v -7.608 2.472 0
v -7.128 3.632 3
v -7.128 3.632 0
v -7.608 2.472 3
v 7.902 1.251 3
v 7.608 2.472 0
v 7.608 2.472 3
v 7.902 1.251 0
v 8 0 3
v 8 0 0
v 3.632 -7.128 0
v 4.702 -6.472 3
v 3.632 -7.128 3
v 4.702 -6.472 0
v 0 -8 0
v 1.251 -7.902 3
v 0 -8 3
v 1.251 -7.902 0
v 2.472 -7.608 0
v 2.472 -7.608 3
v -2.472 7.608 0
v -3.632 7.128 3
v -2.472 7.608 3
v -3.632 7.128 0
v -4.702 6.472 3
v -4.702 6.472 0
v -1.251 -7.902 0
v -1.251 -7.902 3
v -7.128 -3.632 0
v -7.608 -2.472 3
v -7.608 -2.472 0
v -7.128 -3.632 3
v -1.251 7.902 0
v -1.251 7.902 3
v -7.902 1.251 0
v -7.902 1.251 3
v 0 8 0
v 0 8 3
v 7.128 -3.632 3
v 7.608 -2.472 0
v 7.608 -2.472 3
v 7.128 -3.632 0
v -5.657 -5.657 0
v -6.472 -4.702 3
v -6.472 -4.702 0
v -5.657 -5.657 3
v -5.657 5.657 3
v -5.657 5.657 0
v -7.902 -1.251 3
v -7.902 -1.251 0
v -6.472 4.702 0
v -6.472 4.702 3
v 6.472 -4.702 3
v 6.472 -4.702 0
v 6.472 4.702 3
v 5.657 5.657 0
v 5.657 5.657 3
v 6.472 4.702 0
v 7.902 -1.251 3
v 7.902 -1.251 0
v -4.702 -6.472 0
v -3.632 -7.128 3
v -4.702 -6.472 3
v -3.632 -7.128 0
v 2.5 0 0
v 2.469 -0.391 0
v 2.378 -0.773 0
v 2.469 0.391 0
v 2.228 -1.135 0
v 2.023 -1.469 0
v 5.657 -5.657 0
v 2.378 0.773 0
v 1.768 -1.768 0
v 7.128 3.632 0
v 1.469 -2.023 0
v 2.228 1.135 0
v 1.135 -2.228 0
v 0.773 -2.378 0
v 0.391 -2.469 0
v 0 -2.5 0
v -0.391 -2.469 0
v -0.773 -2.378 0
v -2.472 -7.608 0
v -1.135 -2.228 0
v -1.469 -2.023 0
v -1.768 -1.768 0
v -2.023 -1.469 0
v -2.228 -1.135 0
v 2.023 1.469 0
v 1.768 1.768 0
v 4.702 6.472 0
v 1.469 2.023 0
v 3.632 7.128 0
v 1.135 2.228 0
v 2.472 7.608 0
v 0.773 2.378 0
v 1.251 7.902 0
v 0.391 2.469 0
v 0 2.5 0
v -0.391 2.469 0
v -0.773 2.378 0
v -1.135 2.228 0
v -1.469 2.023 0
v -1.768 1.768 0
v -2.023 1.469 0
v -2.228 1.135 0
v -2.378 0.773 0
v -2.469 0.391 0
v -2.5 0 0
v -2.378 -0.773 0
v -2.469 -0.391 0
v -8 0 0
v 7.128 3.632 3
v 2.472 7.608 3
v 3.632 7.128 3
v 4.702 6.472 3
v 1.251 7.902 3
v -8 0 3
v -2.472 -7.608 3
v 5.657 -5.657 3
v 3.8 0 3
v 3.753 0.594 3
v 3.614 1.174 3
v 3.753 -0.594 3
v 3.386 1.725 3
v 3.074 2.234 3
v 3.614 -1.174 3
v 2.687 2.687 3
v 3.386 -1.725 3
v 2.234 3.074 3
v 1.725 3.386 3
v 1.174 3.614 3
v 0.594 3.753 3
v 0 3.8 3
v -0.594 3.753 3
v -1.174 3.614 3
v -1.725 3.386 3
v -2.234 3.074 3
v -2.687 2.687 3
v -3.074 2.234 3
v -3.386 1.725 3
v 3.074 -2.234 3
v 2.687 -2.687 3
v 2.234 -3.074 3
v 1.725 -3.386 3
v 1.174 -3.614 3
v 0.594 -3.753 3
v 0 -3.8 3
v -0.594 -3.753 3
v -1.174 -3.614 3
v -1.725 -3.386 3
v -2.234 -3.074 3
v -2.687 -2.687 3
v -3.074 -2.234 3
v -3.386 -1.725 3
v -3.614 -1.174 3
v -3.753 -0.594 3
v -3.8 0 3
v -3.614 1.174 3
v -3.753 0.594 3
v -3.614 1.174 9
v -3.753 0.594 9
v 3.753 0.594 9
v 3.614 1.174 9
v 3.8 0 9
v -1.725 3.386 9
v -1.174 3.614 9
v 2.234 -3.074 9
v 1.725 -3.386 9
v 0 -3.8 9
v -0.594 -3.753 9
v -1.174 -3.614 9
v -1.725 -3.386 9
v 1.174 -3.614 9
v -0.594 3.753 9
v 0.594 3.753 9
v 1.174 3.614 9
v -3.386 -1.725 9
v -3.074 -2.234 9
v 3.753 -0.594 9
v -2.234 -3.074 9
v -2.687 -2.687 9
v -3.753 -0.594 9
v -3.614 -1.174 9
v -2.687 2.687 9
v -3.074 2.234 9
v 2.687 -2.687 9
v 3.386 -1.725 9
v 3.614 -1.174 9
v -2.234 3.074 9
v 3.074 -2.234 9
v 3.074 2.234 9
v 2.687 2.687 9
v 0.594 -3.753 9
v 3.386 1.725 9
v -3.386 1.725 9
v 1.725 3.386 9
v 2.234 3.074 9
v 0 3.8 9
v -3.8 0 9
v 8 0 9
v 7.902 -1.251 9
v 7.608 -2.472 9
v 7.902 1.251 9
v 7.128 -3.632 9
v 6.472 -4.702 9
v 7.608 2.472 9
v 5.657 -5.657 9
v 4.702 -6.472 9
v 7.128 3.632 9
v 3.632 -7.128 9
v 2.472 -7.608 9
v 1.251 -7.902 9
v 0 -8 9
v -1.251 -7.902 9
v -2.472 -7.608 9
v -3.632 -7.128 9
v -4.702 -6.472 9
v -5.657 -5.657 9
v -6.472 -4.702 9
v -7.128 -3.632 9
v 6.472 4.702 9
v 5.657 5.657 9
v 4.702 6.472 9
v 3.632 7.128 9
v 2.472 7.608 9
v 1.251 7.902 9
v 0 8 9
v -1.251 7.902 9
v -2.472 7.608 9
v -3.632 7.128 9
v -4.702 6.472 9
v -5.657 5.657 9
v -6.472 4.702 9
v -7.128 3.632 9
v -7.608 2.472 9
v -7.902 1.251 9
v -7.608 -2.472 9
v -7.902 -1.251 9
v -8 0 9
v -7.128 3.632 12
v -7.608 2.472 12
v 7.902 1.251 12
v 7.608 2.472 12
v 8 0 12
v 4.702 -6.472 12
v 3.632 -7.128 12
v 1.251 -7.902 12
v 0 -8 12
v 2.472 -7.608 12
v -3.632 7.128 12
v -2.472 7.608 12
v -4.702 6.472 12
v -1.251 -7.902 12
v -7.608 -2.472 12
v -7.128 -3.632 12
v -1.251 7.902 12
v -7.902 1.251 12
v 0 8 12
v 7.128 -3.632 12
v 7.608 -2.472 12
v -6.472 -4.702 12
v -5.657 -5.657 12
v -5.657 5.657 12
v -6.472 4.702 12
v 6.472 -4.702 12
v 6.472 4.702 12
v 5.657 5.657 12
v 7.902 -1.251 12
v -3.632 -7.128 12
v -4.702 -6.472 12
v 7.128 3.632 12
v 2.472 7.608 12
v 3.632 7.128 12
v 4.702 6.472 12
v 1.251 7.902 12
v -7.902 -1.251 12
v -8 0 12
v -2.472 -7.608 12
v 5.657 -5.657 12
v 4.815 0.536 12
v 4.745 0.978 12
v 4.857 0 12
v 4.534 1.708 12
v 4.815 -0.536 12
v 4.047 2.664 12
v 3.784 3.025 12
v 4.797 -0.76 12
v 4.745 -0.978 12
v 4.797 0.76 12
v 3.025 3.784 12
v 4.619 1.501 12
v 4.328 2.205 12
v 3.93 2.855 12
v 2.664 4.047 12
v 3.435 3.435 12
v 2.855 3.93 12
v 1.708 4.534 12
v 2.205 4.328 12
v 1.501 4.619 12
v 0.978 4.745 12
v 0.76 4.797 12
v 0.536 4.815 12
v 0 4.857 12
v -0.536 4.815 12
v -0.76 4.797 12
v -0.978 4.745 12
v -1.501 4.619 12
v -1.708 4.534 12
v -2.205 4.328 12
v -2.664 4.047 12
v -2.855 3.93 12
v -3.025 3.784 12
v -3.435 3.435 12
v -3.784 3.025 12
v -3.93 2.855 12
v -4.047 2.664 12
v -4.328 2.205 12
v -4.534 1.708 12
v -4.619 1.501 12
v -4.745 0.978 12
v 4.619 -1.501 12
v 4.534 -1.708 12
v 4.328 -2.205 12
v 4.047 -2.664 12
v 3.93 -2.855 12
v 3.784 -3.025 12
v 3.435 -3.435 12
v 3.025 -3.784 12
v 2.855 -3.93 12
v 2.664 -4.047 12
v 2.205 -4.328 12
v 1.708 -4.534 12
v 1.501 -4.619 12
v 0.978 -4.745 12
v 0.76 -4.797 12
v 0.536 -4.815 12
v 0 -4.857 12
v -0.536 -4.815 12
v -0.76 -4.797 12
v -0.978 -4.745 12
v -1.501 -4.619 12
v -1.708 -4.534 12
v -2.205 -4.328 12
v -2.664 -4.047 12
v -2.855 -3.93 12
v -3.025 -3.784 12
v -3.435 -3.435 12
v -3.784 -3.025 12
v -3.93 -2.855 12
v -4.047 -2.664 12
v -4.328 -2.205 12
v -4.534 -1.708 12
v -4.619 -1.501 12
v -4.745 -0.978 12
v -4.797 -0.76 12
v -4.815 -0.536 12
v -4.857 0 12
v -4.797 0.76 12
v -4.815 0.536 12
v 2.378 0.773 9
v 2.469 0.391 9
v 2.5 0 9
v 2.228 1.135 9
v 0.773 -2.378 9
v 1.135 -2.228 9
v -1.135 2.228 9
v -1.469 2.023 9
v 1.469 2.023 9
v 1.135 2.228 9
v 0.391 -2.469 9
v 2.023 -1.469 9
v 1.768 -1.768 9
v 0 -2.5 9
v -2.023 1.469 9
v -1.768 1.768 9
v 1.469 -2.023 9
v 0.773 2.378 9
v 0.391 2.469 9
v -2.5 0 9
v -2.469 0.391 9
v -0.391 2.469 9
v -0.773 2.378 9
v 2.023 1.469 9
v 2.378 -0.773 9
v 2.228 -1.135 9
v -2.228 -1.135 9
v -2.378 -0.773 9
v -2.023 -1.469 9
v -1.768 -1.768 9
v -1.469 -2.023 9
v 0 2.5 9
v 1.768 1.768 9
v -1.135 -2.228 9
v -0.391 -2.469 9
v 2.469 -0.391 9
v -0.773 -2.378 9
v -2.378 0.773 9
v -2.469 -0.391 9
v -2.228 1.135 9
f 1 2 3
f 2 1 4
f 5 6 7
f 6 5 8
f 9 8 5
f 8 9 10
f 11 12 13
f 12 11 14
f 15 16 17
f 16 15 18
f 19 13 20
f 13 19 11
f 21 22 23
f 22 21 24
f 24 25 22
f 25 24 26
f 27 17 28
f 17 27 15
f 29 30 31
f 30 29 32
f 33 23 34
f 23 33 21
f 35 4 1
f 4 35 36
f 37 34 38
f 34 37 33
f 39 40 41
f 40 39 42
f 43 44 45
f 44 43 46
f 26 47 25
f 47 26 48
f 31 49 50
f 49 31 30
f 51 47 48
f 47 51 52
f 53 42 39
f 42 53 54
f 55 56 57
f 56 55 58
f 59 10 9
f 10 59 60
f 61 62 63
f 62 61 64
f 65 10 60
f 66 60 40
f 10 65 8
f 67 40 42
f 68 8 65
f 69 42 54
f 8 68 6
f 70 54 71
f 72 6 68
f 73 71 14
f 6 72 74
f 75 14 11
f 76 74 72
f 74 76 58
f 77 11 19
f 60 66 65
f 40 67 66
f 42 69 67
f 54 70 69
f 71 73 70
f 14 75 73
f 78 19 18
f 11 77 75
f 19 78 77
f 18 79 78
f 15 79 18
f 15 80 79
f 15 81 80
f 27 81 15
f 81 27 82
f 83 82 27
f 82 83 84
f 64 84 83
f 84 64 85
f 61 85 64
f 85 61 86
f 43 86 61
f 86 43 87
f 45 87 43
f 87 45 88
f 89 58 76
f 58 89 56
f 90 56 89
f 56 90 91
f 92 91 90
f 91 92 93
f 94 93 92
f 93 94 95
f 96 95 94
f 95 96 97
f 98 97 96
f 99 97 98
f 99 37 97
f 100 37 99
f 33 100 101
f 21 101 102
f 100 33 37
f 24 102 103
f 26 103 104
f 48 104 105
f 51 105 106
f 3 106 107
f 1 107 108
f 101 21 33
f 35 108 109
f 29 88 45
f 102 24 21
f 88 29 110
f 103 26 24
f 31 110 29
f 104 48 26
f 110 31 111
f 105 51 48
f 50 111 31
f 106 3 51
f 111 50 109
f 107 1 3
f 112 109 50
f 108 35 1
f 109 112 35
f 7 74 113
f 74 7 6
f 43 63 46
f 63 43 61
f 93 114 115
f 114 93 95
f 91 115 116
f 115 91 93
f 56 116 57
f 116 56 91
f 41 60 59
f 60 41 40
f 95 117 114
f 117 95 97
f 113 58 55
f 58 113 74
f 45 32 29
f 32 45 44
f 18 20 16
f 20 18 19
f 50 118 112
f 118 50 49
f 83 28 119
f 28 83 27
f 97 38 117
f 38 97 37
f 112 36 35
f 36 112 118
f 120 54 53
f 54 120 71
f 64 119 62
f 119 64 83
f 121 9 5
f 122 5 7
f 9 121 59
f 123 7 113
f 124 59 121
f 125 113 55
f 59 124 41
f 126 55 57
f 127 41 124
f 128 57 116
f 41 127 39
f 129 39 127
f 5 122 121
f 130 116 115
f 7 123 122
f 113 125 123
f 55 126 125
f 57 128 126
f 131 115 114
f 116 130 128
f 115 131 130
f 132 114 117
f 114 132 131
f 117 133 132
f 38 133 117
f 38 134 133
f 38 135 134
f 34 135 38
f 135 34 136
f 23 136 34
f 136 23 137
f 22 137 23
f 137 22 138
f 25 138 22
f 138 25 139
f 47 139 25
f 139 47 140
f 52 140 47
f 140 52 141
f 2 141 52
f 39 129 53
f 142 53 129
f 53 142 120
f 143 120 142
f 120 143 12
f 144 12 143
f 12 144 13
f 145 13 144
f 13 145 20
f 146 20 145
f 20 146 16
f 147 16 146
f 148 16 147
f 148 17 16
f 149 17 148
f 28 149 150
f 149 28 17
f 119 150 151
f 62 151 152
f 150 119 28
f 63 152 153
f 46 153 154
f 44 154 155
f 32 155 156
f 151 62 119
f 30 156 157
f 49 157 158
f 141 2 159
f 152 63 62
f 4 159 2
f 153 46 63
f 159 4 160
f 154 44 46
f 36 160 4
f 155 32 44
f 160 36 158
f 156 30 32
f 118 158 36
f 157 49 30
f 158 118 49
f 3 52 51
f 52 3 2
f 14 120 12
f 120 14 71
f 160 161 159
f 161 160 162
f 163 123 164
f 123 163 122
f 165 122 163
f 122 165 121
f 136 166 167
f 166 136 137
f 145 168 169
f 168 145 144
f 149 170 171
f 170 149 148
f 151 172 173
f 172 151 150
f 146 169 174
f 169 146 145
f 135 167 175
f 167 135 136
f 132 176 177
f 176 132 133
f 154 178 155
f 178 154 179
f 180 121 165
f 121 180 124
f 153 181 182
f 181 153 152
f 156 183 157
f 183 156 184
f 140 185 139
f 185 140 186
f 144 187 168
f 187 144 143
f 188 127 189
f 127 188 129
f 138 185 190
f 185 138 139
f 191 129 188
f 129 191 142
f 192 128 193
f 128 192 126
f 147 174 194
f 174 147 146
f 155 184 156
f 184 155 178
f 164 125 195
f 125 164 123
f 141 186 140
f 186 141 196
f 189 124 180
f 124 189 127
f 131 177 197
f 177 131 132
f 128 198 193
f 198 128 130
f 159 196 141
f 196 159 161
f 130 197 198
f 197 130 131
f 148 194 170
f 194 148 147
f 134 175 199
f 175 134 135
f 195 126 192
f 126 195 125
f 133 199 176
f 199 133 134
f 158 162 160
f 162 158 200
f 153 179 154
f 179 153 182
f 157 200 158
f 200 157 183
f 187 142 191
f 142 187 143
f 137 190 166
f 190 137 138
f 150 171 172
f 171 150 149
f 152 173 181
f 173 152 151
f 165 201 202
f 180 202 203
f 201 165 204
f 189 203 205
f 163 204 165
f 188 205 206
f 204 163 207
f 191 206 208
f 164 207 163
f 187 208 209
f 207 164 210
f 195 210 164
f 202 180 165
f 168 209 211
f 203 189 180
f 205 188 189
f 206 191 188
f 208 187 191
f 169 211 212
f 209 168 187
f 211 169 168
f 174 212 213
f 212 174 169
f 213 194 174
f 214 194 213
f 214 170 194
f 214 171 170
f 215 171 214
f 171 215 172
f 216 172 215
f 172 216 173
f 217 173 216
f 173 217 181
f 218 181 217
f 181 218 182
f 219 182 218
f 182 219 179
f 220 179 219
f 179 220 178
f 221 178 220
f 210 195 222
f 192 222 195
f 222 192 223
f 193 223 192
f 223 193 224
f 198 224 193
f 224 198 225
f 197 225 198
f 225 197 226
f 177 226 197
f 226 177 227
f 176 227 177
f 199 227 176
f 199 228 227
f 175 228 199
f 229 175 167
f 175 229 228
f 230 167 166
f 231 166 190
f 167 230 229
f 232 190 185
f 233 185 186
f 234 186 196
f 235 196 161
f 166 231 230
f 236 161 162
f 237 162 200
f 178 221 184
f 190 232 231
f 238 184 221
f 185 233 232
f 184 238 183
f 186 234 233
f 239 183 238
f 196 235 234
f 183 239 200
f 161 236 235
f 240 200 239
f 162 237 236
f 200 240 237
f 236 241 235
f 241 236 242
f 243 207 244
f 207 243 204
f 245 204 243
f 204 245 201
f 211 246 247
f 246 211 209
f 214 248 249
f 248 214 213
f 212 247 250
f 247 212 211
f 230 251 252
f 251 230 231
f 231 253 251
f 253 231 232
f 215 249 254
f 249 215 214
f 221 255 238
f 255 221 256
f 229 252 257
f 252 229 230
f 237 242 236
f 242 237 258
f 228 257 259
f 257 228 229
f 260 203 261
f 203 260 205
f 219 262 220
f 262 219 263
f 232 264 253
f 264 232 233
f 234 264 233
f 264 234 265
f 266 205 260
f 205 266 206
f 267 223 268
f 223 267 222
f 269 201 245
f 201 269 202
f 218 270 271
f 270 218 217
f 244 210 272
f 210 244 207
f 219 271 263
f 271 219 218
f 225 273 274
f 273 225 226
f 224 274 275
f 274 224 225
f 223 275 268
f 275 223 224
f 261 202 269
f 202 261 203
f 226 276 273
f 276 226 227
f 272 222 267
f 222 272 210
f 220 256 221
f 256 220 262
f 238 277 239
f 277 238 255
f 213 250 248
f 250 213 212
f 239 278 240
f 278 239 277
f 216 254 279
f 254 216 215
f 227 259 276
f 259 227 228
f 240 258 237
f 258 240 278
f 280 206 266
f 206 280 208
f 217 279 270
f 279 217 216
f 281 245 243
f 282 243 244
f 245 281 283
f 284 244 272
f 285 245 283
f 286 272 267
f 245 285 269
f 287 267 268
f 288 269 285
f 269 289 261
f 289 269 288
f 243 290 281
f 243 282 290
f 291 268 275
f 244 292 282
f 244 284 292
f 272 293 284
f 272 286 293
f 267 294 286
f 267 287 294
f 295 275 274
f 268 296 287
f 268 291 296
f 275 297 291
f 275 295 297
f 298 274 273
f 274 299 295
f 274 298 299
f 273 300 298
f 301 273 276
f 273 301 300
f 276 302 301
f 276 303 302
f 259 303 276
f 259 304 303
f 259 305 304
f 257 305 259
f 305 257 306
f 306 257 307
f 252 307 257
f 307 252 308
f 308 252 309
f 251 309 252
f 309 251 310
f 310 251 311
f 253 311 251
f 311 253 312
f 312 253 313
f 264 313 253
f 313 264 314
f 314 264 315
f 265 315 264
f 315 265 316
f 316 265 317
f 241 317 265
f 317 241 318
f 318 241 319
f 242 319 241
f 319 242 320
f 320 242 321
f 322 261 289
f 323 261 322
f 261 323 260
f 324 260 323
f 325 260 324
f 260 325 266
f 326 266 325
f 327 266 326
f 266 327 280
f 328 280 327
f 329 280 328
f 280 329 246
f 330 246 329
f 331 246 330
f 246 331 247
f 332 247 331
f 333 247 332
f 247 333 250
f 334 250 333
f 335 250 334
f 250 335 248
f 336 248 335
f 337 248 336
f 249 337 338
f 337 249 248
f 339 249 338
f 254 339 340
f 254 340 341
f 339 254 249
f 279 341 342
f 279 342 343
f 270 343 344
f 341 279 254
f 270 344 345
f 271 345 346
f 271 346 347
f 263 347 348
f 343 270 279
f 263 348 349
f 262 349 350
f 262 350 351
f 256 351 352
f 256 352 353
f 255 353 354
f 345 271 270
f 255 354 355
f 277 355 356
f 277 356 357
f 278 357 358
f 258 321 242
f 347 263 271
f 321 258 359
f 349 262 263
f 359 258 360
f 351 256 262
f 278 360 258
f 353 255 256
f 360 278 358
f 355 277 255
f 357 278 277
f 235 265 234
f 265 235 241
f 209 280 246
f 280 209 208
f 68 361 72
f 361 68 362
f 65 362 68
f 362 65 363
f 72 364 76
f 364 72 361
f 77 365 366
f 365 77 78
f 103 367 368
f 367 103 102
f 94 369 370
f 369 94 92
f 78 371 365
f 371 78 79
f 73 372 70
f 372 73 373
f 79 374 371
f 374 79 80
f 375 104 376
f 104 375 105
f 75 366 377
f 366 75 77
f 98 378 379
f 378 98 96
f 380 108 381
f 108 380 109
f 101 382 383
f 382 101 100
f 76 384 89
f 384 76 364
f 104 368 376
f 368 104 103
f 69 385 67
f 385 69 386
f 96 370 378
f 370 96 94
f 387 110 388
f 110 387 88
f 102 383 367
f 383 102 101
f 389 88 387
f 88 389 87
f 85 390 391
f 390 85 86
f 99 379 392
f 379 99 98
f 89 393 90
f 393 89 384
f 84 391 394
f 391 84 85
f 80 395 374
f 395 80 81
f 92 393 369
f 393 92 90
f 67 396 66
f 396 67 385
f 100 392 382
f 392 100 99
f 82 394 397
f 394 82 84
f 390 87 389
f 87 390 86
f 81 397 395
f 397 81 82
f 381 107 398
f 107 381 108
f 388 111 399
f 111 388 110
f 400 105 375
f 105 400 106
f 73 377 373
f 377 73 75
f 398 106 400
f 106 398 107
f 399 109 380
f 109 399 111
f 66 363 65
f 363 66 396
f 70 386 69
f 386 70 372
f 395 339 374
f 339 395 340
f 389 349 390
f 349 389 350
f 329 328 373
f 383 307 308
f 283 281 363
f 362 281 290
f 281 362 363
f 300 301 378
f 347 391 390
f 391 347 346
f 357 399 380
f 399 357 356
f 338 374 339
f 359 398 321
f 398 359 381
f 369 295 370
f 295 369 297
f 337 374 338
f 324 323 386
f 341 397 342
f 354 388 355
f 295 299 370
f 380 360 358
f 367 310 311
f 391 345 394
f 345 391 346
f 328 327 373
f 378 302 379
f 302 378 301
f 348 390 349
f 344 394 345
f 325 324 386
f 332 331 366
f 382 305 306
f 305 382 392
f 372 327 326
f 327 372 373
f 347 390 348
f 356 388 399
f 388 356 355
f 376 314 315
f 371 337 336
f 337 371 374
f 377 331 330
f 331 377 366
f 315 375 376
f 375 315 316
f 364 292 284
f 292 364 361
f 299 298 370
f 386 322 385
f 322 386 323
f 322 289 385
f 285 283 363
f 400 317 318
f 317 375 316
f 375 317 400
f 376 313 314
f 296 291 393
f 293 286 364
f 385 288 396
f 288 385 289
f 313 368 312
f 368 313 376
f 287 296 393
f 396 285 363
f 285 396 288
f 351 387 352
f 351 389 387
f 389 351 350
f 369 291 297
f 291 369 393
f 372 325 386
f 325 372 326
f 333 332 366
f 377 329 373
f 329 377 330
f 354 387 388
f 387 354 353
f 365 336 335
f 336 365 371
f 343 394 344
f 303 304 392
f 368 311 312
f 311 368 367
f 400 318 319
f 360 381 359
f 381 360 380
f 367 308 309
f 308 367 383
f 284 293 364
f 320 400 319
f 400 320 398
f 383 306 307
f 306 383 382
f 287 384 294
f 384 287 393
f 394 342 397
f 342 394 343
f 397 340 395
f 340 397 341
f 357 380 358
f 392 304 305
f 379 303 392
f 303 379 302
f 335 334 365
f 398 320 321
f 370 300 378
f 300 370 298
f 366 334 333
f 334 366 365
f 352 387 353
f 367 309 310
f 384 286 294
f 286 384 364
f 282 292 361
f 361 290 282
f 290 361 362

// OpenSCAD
/******************************************************************************/
/**********                     INFO                                 **********/
/******************************************************************************/
/*
Rail Button 1.0 April 2016
by David Buhler

Rail buttons or guides for model and high power rockets launching from 1010 or 
1515 size slot aluminum extrusions. ( https://www.8020.net/ ). These are not as 
strong as the delrin or nylon versions but hey you can easily make this yourself.
The 1515 guides are set to use 8-32 screws but could be opened up a bit for 
10-32 screws with a 3/16" drill bit.

Use support so the upper disk of the button is supported and straight. This is 
the portion that is inserted inside the rail and most critical for fit. 
Alternatively you could print these upside down and have the inside rail portion 
cleanly built. Your choice. I used three walls (1.2mm) . 

Attribution-NonCommercial 3.0 (CC BY-NC 3.0)
http://creativecommons.org/licenses/by-nc/3.0/

*/

/******************************************************************************/
/**********                     Settings                             **********/
/******************************************************************************/
//adjust the follow to meet your needs,  all measurements in mm.

/* [Select Button] */
button_to_make="1515";//[1010,1515,manual]

/* [Manual Button Diameters] */
man_button_outer_dia=11.1;//
man_button_inner_dia=5.8;//
man_thickness=1.9;//
man_button_middle=3.8;//
man_screw_size=3.05;//



/******************************************************************************/
/**********                   Variable Calcs                         **********/
/****                     no need to adjust these                      ********/
/******************************************************************************/
/* [HIDDEN] */
//1010 button, 
button_outer_dia=11.1;
button_inner_dia=5.8;
thickness=1.9;
button_middle=3.8;
screw_size=3.05;

//1515 button
button_outer_dia_1515=16;
button_inner_dia_1515=7.6;
thickness_1515=3;
button_middle_1515=6;
screw_size_1515=5;

/******************************************************************************/
/**********                  Make It Happen Stuff                    **********/
/******************************************************************************/
if (button_to_make=="1010"){
    difference(){
        union(){
            cylinder(r=button_outer_dia/2,h=thickness,$fn=40);//bottom disk
            translate([0,0,thickness]) 
                cylinder (r=button_inner_dia/2,h=button_middle,$fn=40);//middle slot
            translate([0,0,button_middle+thickness]) 
                cylinder (r=button_outer_dia/2,h=thickness,$fn=40);//top disk
        }
        translate([0,0,-1]) 
            cylinder (r=screw_size/2,h=50,$fn=40);//screw hole
        translate([0,0,button_middle+thickness]) 
            cylinder (r1=screw_size/2,r2=screw_size+3,h=button_middle+1,$fn=40);//screw head bevel
    }
}
else if(button_to_make=="1515"){
    difference(){
        union(){
            cylinder(r=button_outer_dia_1515/2,h=thickness_1515,$fn=40);//bottom disk
            translate([0,0,thickness_1515]) 
                cylinder (r=button_inner_dia_1515/2,h=button_middle_1515,$fn=40);//middle slot
            translate([0,0,button_middle_1515+thickness_1515]) 
                cylinder (r=button_outer_dia_1515/2,h=thickness_1515,$fn=40);//top disk
        }
        translate([0,0,-1]) 
            cylinder (r=screw_size_1515/2,h=50,$fn=40);//screw hole
        translate([0,0,button_middle_1515+thickness_1515]) 
            cylinder (r1=screw_size_1515/2,r2=screw_size_1515+3,h=button_middle_1515+1,$fn=40);//screw head bevel
    }
}
else if(button_to_make=="manual"){
    difference(){
        union(){
            cylinder(r=man_button_outer_dia/2,h=man_thickness,$fn=40);//bottom disk
            translate([0,0,man_thickness]) 
                cylinder (r=man_button_inner_dia/2,h=man_button_middle,$fn=40);//middle slot
            translate([0,0,man_button_middle+man_thickness]) 
                cylinder (r=man_button_outer_dia/2,h=man_thickness,$fn=40);//top disk
        }
        translate([0,0,-1]) 
            cylinder (r=man_screw_size/2,h=50,$fn=40);//screw hole
        translate([0,0,man_button_middle+man_thickness]) 
            cylinder (r1=man_screw_size/2,r2=man_screw_size+3,h=man_button_middle+1,$fn=40);//screw head bevel
    }
}
/******************************************************************************/
/**********                         Modules                          **********/
/******************************************************************************/
